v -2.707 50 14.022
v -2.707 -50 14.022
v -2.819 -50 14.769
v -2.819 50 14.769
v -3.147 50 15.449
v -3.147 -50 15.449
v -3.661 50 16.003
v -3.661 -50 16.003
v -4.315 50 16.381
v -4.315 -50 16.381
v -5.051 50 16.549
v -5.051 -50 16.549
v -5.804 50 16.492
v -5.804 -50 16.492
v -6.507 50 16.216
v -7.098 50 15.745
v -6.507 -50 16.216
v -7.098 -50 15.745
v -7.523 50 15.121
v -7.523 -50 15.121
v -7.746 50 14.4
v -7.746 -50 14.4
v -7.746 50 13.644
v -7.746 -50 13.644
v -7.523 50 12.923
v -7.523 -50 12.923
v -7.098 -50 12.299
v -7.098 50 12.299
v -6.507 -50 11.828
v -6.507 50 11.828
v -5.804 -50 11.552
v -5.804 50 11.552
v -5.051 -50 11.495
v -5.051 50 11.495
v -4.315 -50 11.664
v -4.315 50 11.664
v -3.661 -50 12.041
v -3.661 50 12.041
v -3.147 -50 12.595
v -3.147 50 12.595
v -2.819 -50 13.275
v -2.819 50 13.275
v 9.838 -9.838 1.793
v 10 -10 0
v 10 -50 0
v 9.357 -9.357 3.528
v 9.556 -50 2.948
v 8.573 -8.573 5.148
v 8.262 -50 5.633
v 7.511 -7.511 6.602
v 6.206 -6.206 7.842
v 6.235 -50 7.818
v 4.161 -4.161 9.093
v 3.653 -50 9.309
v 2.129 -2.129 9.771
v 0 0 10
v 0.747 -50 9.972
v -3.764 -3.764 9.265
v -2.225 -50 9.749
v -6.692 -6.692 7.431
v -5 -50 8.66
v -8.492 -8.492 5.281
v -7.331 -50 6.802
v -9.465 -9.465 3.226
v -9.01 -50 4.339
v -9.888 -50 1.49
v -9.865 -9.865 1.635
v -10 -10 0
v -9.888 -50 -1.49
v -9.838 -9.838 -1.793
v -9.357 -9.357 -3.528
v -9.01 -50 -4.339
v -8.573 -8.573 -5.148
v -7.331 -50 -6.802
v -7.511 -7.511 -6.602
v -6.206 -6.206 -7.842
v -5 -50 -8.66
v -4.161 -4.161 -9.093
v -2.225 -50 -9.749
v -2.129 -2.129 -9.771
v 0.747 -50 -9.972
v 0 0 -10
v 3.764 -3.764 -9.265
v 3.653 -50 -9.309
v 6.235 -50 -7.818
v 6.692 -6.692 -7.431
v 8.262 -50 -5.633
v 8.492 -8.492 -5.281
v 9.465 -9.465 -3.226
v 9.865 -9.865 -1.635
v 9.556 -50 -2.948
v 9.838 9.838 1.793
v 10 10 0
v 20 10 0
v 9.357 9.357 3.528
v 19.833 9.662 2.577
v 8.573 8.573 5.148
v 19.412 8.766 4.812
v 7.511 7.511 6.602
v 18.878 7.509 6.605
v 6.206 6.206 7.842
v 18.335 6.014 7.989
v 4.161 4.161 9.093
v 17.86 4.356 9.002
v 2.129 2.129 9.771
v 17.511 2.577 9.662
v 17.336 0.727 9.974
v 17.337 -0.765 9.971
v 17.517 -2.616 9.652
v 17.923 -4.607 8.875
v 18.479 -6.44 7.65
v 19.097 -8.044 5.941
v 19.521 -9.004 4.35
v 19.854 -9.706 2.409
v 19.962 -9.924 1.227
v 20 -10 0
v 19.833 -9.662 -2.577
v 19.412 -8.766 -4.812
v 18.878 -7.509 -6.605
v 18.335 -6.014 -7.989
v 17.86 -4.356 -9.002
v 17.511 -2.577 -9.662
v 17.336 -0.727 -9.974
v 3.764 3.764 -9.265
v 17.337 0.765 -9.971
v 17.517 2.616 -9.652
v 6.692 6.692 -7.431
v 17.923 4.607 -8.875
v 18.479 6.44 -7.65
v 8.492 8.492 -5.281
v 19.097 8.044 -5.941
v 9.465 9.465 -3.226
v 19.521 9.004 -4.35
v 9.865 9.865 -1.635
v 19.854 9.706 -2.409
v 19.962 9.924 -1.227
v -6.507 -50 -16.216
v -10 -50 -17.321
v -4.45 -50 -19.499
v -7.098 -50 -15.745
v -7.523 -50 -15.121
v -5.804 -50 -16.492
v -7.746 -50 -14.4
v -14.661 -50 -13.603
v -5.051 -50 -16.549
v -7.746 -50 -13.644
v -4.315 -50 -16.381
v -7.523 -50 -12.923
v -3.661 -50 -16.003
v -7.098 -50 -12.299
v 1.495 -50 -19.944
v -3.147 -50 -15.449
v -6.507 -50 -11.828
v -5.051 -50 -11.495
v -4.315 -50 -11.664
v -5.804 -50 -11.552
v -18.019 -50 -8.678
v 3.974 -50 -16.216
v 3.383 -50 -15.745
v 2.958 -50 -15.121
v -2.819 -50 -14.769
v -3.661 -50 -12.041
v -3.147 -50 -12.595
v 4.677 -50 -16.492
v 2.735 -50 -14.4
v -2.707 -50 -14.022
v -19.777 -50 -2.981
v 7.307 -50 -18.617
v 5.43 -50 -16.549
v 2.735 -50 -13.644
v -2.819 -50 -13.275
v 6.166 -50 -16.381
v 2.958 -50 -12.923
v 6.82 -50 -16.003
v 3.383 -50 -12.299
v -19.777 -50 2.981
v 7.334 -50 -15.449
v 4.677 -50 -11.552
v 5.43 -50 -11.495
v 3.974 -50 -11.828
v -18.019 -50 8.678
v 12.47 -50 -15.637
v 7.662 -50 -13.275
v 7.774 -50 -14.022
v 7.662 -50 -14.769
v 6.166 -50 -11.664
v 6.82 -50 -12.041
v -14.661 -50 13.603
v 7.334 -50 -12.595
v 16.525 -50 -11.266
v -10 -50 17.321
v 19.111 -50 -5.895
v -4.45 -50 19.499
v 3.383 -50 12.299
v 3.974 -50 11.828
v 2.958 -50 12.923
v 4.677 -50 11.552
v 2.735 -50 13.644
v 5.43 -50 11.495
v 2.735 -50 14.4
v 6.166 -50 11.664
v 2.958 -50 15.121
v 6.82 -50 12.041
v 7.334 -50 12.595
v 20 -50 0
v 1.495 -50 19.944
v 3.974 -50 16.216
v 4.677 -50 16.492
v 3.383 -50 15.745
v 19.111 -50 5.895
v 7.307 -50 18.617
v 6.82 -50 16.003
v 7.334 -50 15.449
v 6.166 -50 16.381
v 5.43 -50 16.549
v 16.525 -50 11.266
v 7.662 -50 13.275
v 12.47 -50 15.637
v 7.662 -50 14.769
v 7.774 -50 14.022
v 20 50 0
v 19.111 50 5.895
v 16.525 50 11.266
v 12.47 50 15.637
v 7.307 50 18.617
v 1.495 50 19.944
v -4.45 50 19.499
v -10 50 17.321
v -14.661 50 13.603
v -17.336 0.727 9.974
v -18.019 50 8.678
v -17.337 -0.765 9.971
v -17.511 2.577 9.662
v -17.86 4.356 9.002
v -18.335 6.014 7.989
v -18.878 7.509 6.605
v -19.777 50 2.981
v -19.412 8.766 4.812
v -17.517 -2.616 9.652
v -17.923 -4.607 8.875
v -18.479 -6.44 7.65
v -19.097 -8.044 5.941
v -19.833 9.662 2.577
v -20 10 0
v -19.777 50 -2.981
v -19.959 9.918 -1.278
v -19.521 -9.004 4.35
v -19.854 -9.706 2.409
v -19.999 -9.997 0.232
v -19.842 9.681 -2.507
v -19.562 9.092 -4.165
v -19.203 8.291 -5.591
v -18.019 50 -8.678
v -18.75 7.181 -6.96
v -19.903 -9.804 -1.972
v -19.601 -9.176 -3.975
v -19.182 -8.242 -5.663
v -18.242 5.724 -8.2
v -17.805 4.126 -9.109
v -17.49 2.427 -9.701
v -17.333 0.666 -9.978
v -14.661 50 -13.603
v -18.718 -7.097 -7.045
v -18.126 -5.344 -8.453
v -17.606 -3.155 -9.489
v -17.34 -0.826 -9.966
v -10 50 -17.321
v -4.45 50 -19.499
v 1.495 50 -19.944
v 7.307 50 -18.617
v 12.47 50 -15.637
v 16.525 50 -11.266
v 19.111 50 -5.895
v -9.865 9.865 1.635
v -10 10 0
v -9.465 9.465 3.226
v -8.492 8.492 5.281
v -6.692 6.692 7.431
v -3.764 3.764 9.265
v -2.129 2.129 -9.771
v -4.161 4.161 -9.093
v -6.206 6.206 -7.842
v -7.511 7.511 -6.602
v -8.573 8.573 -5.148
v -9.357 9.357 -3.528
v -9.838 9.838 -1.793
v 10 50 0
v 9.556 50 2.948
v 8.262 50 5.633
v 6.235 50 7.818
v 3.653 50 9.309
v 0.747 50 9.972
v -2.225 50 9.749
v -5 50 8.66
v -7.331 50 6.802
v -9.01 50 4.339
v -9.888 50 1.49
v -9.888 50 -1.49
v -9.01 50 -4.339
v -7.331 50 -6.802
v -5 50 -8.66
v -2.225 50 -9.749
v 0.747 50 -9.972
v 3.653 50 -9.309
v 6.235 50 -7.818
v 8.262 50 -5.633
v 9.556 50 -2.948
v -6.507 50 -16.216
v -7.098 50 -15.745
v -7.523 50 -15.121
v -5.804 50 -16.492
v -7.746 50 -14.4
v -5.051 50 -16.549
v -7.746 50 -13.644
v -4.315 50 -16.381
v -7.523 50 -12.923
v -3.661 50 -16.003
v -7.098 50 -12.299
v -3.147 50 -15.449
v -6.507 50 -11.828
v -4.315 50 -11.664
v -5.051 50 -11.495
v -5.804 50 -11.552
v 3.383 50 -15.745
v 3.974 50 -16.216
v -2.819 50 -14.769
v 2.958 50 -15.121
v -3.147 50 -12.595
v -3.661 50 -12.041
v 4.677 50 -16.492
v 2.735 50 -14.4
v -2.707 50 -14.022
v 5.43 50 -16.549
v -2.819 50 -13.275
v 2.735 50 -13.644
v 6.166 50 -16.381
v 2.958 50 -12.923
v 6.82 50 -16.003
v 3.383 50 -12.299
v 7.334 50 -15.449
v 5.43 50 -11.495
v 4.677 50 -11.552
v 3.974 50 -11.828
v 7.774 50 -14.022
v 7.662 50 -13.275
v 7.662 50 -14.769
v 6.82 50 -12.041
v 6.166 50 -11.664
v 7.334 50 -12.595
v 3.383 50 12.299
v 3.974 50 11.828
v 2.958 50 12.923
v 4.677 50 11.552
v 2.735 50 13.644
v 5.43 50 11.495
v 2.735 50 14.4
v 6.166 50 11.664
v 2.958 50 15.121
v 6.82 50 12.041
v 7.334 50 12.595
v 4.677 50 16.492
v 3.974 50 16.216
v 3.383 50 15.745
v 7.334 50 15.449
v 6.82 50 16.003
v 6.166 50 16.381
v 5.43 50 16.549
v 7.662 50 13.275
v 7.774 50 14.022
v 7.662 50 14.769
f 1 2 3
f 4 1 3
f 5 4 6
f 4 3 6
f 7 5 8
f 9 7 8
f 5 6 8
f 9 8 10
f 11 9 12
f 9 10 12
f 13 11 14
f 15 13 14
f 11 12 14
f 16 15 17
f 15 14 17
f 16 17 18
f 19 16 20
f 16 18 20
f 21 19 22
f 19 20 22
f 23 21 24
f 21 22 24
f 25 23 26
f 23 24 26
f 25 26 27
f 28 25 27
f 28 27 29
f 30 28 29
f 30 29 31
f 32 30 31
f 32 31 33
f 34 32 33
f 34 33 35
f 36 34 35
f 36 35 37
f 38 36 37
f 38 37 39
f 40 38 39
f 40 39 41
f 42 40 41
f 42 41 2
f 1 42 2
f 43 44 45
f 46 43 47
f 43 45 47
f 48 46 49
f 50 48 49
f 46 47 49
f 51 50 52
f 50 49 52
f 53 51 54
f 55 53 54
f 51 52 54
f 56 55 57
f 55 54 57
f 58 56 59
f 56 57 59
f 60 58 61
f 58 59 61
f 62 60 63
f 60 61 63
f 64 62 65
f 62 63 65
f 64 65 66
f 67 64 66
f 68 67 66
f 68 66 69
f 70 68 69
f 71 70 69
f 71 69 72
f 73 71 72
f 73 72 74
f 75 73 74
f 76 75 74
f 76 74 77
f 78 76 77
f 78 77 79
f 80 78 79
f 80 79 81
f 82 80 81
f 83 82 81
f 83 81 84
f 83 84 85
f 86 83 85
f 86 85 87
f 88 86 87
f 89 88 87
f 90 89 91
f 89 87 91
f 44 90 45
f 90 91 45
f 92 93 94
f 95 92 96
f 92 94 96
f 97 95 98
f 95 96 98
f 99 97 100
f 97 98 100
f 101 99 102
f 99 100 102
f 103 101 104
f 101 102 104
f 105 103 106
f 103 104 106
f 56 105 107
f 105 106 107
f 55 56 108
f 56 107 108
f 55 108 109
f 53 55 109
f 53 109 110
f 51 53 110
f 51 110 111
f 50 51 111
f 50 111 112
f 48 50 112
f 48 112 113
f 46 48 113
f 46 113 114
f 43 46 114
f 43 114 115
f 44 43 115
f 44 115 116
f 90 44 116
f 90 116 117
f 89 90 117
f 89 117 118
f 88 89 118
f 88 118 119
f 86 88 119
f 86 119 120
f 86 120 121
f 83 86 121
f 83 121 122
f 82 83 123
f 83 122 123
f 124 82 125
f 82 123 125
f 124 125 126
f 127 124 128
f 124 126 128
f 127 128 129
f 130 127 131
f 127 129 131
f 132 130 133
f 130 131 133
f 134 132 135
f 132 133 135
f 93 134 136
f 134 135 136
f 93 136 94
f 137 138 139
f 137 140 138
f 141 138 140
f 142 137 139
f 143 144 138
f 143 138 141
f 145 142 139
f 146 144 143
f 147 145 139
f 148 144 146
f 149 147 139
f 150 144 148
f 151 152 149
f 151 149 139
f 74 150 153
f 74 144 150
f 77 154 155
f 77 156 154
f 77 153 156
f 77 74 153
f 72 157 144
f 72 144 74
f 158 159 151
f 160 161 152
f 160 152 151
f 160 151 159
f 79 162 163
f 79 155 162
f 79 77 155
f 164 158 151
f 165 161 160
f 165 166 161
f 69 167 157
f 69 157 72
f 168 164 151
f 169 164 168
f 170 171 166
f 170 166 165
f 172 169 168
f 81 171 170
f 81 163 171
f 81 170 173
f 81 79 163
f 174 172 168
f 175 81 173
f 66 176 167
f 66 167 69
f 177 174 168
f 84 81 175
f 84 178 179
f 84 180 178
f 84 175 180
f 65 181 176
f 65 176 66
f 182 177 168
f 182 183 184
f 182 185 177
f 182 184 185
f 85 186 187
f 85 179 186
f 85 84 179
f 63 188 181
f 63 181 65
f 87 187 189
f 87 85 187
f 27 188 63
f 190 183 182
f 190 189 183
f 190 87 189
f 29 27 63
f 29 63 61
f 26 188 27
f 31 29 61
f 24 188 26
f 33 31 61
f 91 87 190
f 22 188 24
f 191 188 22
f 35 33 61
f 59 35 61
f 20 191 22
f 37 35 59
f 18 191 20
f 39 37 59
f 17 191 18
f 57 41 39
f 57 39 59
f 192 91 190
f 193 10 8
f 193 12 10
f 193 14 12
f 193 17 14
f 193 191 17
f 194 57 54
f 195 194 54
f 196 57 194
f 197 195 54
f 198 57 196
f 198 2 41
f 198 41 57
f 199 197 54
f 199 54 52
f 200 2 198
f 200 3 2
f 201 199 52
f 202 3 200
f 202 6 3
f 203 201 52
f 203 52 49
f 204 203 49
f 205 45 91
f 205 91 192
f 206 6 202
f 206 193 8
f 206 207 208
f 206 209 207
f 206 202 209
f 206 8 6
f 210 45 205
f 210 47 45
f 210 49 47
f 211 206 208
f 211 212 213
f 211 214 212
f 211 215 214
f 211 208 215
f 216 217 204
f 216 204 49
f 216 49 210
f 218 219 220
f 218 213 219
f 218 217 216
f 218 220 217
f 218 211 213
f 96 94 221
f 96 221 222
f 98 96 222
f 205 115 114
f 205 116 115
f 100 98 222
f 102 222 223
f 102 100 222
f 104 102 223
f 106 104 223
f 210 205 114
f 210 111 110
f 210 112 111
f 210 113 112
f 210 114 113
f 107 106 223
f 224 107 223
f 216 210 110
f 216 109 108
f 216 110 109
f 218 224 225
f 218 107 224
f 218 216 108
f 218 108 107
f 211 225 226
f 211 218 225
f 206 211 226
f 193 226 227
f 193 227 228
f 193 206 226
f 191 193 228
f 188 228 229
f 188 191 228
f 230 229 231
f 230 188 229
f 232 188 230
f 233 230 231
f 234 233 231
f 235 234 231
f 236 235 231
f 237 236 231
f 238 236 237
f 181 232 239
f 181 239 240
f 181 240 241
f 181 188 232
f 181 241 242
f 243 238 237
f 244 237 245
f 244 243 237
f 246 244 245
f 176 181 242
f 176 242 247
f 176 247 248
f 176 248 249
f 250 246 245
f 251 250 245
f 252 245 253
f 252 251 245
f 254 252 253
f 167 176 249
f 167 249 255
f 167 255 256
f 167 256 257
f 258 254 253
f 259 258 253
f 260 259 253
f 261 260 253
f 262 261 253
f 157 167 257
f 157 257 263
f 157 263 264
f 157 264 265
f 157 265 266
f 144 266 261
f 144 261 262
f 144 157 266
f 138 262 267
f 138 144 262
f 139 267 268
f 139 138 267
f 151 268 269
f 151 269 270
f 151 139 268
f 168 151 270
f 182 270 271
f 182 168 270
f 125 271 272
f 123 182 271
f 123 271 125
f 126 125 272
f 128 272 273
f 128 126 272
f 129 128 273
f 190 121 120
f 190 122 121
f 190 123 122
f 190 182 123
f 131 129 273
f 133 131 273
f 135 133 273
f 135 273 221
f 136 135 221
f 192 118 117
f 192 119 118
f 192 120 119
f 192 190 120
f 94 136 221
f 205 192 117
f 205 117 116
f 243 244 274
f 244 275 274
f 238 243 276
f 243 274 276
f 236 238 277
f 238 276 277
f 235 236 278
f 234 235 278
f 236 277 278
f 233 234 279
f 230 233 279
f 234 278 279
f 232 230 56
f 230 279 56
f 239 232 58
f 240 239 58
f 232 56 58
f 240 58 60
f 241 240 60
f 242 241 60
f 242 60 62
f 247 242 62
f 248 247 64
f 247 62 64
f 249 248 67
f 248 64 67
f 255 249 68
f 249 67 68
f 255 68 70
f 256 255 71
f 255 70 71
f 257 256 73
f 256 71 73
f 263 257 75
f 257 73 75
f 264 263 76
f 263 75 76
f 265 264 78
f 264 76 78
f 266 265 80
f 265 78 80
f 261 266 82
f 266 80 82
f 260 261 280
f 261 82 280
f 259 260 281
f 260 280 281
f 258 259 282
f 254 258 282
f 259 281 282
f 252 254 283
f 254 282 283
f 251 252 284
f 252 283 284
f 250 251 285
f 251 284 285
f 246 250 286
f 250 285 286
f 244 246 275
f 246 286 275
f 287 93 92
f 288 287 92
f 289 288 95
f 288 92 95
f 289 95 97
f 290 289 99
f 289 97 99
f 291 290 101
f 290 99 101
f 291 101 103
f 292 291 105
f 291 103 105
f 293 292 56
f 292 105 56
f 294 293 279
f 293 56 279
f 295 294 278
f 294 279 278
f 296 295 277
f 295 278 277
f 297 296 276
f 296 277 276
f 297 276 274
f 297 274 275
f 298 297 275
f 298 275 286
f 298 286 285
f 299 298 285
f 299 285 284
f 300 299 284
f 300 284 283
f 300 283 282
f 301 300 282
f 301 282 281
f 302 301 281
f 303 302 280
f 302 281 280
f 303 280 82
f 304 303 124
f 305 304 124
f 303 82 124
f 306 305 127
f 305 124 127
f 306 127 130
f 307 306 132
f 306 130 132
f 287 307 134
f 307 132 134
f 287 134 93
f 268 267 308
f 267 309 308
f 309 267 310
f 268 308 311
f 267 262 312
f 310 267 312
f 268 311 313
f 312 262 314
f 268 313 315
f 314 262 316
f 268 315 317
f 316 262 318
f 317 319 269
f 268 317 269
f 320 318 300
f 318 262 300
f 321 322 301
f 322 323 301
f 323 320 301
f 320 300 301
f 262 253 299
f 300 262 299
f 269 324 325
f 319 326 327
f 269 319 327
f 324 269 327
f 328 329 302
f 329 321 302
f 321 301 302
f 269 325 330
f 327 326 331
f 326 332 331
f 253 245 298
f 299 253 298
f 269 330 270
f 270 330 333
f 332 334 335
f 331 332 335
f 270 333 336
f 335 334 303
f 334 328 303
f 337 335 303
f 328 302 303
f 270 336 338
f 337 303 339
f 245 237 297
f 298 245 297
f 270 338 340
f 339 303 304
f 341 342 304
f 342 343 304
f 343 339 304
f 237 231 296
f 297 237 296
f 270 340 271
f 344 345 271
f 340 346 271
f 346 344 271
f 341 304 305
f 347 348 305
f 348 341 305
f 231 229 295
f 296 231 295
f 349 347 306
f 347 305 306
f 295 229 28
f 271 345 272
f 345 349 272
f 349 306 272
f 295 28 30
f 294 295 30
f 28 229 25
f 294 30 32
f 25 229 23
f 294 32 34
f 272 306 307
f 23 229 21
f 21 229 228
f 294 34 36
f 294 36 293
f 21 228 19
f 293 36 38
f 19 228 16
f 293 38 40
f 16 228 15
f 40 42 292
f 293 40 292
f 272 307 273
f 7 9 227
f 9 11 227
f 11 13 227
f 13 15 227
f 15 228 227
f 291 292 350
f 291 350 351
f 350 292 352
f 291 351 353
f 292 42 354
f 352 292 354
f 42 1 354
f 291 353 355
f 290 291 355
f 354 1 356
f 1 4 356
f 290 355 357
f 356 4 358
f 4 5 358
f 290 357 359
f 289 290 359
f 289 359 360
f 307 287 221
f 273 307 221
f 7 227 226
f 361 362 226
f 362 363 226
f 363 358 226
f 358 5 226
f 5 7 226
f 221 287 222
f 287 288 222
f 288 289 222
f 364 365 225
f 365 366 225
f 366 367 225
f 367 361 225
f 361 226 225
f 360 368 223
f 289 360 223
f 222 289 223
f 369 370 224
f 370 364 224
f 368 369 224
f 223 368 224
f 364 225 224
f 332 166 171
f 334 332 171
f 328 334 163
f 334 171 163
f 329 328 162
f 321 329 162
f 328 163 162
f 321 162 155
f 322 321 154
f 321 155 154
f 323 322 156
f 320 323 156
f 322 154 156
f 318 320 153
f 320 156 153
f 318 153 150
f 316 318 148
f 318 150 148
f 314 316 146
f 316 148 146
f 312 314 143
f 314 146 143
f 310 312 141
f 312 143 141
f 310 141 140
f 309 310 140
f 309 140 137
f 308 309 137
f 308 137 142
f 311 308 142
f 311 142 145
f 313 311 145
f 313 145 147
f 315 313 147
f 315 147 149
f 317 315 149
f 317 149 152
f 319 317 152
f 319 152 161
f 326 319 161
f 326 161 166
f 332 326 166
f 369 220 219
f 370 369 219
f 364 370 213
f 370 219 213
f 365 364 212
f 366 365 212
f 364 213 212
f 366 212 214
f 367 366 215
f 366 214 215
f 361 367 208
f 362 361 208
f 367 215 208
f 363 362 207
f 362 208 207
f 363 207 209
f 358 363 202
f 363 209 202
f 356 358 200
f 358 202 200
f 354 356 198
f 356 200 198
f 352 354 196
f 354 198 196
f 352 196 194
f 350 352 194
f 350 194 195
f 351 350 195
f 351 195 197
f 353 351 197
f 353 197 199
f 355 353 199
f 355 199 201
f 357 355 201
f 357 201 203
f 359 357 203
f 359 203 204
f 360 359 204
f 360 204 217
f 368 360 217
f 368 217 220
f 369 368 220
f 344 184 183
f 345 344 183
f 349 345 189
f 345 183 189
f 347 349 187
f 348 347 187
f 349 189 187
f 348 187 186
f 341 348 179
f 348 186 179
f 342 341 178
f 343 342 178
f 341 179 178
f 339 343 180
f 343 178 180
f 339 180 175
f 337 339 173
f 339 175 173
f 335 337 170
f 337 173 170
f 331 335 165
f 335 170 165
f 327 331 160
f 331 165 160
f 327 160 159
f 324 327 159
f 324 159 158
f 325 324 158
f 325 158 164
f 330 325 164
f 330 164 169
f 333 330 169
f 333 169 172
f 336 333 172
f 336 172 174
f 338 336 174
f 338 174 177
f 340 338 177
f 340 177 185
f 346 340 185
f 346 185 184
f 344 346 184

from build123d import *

# Parameters (mm, degrees)
F0_R      = 20
F1_DEPTH  = 50
F3_R      = 10
F4_DEPTH  = 120
F6_R      = 10
F7_DEPTH  = 50
F8_R      = 2.533674
F9_DEPTH  = 101
F10_DEPTH = 101


with BuildPart() as f1:
    # F0 (on Front) → F1 (new body, symmetric)
    with BuildSketch(Plane.XZ):
        Circle(F0_R)
    extrude(amount=F1_DEPTH, both=True)

    # F3 (on offset) → F4 (cut)
    with BuildSketch(Plane.XZ.offset(60)):
        Circle(F3_R)
    extrude(amount=-F4_DEPTH, mode=Mode.SUBTRACT)

    # F6 (on offset) → F7 (cut, symmetric)
    with BuildSketch(Plane.YZ.offset(30)):
        Circle(F6_R)
    extrude(amount=F7_DEPTH, both=True, mode=Mode.SUBTRACT)

    # F8 (on face) → F9 (cut)
    with BuildSketch(Plane.XZ.offset(50)):
        with Locations((5.240558, 14.022033)):
            Circle(F8_R)
    extrude(amount=-F9_DEPTH, mode=Mode.SUBTRACT)

    # F8 (on face) → F10 (cut)
    with BuildSketch(Plane.XZ.offset(50)):
        with Locations((-5.240558, 14.022033)):
            Circle(F8_R)
        with Locations((-5.240558, -14.022033)):
            Circle(F8_R)
        with Locations((5.240558, -14.022033)):
            Circle(F8_R)
    extrude(amount=-F10_DEPTH, mode=Mode.SUBTRACT)


solid = f1.part
